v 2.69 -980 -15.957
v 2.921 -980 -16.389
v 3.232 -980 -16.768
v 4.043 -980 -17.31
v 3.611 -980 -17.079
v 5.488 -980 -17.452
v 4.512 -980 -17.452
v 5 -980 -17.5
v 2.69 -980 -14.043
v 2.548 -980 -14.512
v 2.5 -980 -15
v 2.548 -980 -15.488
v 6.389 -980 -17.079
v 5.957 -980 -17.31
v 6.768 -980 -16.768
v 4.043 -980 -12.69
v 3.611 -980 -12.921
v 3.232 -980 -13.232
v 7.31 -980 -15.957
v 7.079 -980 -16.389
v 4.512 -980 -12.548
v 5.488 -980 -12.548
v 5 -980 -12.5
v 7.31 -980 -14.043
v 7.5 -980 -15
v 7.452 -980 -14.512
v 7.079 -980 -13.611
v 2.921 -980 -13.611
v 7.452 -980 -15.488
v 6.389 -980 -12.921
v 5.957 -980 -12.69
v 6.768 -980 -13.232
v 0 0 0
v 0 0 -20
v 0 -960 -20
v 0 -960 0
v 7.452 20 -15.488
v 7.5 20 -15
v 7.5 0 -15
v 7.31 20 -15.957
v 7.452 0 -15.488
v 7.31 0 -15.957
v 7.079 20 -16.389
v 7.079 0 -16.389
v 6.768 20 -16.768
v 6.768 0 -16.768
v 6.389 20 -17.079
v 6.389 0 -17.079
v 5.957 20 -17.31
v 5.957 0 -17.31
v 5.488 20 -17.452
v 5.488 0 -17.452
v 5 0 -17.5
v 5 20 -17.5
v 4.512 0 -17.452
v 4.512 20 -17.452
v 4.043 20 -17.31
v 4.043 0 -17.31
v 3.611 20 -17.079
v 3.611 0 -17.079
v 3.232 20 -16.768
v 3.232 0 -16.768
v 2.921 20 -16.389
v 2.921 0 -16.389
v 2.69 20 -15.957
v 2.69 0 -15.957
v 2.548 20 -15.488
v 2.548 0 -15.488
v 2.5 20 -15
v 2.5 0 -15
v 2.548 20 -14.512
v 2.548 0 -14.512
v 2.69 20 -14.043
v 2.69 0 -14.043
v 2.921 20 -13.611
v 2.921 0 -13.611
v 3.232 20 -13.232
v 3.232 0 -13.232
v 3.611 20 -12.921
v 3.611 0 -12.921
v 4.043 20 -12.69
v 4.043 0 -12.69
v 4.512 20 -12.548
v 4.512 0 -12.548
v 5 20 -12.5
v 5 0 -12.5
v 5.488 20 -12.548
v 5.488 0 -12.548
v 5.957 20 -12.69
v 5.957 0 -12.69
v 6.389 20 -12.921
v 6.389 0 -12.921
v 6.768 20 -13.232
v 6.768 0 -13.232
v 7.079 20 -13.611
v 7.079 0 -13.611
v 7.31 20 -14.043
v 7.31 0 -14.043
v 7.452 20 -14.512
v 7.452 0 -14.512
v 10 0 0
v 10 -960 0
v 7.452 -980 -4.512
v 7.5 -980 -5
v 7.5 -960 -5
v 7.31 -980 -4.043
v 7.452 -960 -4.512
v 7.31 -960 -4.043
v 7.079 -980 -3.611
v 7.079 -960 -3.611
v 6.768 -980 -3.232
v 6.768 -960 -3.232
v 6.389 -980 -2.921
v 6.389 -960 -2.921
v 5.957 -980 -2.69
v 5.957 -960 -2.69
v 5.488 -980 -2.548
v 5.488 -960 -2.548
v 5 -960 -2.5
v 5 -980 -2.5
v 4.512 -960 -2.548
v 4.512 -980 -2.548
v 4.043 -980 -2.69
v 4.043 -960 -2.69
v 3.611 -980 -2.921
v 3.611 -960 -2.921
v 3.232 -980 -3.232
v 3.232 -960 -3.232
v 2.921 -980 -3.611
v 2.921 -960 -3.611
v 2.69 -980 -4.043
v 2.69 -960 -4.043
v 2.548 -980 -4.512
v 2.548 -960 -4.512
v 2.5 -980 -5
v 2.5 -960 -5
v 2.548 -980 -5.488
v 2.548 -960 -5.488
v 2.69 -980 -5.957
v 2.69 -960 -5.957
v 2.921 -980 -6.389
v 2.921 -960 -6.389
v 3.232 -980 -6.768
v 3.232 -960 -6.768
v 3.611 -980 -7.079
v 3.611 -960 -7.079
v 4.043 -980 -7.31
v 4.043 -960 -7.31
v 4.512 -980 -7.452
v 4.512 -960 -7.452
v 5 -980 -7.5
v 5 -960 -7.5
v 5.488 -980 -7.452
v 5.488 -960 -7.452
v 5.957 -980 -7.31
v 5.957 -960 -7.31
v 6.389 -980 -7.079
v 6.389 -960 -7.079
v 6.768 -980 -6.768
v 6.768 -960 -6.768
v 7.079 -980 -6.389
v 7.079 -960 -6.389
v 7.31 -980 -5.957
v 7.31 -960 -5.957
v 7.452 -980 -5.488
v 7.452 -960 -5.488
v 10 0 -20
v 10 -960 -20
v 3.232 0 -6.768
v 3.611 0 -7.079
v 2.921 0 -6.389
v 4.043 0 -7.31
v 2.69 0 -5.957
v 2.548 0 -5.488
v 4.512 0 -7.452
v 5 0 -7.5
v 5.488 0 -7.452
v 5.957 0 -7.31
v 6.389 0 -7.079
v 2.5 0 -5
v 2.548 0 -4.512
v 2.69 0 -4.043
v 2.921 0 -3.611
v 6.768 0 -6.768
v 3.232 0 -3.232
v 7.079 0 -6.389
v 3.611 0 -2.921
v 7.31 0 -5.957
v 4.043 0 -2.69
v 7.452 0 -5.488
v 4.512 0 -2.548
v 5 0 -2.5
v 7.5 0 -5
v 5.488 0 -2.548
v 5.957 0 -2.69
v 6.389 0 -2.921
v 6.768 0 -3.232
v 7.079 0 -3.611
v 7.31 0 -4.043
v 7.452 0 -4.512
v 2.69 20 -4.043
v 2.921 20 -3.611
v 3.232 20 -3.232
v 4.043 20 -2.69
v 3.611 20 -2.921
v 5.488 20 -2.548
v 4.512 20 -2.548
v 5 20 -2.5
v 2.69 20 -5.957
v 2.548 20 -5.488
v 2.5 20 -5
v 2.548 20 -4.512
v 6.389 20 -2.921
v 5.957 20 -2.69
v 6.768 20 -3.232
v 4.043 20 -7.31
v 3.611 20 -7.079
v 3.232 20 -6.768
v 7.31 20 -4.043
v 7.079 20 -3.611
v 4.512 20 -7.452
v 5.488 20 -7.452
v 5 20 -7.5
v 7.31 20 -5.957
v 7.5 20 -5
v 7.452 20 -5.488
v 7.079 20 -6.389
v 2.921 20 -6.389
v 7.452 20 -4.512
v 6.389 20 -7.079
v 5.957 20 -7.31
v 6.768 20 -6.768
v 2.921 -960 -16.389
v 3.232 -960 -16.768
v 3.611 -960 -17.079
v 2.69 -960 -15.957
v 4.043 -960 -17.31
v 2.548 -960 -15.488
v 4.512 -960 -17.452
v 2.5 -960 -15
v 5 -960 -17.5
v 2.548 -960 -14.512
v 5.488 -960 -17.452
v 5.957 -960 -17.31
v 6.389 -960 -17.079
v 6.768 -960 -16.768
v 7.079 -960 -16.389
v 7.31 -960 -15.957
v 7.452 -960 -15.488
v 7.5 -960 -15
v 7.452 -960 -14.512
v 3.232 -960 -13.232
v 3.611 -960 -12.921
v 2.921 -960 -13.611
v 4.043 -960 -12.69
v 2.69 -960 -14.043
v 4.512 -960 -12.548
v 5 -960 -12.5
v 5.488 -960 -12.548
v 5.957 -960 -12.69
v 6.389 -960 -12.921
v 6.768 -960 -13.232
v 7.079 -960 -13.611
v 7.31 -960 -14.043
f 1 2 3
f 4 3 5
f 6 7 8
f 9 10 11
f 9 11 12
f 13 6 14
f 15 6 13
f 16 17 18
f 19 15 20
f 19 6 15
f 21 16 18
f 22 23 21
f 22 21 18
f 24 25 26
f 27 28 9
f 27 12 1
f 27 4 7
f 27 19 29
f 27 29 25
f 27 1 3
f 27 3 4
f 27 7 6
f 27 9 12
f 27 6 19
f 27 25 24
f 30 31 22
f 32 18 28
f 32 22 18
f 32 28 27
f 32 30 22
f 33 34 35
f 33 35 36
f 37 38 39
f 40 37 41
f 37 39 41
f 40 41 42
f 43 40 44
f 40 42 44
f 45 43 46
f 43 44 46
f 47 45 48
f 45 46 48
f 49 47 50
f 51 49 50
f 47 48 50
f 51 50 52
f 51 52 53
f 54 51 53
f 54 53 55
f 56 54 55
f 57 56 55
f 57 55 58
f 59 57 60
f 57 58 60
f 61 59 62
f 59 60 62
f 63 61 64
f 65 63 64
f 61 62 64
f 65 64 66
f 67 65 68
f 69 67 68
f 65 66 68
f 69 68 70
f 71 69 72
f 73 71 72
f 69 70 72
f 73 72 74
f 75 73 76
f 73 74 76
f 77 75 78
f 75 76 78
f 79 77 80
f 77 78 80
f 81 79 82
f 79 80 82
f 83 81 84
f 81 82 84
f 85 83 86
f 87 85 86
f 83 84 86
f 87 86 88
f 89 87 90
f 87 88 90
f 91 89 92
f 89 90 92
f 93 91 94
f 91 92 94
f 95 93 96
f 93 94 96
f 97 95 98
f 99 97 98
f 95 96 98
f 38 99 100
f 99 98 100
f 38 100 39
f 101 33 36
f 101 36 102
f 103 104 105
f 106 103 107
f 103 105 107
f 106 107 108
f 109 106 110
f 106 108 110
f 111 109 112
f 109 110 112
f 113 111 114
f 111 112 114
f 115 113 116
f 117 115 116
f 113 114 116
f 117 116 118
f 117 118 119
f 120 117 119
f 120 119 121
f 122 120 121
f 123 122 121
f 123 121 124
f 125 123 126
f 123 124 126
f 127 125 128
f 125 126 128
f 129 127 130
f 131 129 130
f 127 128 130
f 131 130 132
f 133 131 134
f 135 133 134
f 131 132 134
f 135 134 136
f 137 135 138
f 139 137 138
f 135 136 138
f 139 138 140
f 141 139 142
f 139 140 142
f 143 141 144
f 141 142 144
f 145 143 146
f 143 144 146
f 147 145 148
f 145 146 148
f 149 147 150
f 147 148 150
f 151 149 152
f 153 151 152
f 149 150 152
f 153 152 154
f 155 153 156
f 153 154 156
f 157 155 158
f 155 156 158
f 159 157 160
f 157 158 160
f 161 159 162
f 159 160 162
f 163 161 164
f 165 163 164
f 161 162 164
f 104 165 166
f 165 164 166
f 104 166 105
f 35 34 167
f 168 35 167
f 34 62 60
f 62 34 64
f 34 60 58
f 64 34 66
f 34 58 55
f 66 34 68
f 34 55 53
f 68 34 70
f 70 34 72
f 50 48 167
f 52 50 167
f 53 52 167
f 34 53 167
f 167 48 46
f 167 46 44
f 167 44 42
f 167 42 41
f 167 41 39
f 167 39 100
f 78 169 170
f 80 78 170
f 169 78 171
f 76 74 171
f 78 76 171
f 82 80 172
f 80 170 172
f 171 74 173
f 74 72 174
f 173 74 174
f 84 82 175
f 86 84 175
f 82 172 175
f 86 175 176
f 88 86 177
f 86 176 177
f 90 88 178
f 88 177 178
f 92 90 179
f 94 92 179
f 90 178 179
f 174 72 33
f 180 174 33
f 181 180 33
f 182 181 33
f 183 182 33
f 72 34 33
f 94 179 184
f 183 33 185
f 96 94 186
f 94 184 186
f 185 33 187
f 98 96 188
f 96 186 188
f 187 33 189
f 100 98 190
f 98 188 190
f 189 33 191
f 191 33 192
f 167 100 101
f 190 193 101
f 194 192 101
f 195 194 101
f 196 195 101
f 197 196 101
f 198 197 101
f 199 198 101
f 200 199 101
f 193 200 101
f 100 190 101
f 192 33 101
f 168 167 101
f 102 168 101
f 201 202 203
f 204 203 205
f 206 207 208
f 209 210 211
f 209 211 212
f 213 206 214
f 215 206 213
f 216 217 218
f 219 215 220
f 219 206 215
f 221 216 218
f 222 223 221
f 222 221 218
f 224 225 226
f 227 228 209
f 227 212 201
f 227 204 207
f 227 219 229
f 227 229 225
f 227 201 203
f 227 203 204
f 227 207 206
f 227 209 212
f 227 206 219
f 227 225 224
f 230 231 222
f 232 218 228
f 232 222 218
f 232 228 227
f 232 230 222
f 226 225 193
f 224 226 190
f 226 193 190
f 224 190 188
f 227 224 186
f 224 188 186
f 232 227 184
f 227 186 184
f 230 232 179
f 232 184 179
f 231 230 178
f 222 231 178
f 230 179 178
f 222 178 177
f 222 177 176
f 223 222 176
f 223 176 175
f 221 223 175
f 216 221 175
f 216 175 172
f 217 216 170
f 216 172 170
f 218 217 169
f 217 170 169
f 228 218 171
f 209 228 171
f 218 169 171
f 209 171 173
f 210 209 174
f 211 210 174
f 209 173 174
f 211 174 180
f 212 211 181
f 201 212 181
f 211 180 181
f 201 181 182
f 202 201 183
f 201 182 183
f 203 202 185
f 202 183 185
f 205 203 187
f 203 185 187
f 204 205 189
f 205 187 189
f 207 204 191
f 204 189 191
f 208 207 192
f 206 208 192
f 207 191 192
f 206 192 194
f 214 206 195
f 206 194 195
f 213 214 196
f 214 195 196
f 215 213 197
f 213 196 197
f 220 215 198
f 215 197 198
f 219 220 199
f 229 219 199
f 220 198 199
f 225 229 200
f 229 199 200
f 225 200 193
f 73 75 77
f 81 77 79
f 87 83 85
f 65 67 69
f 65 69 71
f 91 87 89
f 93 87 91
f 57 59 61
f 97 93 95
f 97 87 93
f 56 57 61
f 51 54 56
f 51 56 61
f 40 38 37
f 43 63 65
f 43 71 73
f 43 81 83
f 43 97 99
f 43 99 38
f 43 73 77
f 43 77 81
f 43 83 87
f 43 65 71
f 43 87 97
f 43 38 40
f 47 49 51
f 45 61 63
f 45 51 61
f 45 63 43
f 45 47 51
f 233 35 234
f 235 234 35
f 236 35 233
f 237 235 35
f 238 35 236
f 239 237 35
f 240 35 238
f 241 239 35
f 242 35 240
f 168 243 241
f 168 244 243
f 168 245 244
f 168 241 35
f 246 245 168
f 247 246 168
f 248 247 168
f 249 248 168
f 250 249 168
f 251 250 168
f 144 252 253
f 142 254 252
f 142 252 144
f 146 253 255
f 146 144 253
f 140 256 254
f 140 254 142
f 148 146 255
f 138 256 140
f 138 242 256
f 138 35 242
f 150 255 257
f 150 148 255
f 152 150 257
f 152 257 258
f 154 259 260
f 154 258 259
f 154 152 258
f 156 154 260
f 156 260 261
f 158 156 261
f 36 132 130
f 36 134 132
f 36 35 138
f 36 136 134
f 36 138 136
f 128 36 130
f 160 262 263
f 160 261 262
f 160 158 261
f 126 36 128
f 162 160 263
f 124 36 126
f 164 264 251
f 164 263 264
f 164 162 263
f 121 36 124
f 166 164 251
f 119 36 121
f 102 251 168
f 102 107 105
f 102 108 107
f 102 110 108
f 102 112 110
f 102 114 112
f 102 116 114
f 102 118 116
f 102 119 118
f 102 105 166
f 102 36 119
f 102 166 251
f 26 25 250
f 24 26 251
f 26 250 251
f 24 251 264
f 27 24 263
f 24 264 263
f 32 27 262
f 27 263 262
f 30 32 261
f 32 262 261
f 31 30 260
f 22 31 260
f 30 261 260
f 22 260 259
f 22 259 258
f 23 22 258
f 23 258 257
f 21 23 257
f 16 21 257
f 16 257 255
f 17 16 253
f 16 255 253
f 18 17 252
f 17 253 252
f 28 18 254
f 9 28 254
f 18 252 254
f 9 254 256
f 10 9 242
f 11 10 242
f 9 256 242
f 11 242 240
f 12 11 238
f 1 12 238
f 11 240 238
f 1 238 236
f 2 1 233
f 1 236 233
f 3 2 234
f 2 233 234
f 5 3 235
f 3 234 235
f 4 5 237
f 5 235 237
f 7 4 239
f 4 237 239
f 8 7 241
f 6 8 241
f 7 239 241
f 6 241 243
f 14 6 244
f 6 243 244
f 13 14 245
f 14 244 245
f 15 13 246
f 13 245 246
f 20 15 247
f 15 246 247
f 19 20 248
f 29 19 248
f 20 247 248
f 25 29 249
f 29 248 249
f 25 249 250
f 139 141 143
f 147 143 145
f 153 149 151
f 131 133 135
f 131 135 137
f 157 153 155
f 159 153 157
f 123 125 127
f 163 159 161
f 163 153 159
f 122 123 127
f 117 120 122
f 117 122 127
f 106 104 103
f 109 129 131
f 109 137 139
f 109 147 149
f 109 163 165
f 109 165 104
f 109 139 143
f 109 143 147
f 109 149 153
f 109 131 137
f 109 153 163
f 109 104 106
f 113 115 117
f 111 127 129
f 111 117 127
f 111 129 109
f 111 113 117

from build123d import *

# Parameters (mm, degrees)
SKETCH_W     = 10
SKETCH_H     = 20
PAD_DEPTH    = 960
SKETCH001_R  = 2.5
PAD001_DEPTH = 20
SKETCH002_R  = 2.5
PAD002_DEPTH = 20


with BuildPart() as part:
    # Sketch → Pad (new body)
    with BuildSketch(Plane.XZ):
        with Locations((5, -10)):
            Rectangle(SKETCH_W, SKETCH_H)
    extrude(amount=PAD_DEPTH)

    # Sketch001 (on Face6 of Pad) → Pad001 (join)
    with BuildSketch(Plane.XZ.offset(960)):
        with Locations((5, -5)):
            Circle(SKETCH001_R)
        with Locations((5, -15)):
            Circle(SKETCH001_R)
    extrude(amount=PAD001_DEPTH)

    # Sketch002 (on Face4 of Pad001) → Pad002 (join)
    with BuildSketch(Plane(origin=(0, 0, 0), x_dir=(1, 0, 0), z_dir=(0, 1, 0))):
        with Locations((5, 15)):
            Circle(SKETCH002_R)
        with Locations((5, 5)):
            Circle(SKETCH002_R)
    extrude(amount=PAD002_DEPTH)


solid = part.part
